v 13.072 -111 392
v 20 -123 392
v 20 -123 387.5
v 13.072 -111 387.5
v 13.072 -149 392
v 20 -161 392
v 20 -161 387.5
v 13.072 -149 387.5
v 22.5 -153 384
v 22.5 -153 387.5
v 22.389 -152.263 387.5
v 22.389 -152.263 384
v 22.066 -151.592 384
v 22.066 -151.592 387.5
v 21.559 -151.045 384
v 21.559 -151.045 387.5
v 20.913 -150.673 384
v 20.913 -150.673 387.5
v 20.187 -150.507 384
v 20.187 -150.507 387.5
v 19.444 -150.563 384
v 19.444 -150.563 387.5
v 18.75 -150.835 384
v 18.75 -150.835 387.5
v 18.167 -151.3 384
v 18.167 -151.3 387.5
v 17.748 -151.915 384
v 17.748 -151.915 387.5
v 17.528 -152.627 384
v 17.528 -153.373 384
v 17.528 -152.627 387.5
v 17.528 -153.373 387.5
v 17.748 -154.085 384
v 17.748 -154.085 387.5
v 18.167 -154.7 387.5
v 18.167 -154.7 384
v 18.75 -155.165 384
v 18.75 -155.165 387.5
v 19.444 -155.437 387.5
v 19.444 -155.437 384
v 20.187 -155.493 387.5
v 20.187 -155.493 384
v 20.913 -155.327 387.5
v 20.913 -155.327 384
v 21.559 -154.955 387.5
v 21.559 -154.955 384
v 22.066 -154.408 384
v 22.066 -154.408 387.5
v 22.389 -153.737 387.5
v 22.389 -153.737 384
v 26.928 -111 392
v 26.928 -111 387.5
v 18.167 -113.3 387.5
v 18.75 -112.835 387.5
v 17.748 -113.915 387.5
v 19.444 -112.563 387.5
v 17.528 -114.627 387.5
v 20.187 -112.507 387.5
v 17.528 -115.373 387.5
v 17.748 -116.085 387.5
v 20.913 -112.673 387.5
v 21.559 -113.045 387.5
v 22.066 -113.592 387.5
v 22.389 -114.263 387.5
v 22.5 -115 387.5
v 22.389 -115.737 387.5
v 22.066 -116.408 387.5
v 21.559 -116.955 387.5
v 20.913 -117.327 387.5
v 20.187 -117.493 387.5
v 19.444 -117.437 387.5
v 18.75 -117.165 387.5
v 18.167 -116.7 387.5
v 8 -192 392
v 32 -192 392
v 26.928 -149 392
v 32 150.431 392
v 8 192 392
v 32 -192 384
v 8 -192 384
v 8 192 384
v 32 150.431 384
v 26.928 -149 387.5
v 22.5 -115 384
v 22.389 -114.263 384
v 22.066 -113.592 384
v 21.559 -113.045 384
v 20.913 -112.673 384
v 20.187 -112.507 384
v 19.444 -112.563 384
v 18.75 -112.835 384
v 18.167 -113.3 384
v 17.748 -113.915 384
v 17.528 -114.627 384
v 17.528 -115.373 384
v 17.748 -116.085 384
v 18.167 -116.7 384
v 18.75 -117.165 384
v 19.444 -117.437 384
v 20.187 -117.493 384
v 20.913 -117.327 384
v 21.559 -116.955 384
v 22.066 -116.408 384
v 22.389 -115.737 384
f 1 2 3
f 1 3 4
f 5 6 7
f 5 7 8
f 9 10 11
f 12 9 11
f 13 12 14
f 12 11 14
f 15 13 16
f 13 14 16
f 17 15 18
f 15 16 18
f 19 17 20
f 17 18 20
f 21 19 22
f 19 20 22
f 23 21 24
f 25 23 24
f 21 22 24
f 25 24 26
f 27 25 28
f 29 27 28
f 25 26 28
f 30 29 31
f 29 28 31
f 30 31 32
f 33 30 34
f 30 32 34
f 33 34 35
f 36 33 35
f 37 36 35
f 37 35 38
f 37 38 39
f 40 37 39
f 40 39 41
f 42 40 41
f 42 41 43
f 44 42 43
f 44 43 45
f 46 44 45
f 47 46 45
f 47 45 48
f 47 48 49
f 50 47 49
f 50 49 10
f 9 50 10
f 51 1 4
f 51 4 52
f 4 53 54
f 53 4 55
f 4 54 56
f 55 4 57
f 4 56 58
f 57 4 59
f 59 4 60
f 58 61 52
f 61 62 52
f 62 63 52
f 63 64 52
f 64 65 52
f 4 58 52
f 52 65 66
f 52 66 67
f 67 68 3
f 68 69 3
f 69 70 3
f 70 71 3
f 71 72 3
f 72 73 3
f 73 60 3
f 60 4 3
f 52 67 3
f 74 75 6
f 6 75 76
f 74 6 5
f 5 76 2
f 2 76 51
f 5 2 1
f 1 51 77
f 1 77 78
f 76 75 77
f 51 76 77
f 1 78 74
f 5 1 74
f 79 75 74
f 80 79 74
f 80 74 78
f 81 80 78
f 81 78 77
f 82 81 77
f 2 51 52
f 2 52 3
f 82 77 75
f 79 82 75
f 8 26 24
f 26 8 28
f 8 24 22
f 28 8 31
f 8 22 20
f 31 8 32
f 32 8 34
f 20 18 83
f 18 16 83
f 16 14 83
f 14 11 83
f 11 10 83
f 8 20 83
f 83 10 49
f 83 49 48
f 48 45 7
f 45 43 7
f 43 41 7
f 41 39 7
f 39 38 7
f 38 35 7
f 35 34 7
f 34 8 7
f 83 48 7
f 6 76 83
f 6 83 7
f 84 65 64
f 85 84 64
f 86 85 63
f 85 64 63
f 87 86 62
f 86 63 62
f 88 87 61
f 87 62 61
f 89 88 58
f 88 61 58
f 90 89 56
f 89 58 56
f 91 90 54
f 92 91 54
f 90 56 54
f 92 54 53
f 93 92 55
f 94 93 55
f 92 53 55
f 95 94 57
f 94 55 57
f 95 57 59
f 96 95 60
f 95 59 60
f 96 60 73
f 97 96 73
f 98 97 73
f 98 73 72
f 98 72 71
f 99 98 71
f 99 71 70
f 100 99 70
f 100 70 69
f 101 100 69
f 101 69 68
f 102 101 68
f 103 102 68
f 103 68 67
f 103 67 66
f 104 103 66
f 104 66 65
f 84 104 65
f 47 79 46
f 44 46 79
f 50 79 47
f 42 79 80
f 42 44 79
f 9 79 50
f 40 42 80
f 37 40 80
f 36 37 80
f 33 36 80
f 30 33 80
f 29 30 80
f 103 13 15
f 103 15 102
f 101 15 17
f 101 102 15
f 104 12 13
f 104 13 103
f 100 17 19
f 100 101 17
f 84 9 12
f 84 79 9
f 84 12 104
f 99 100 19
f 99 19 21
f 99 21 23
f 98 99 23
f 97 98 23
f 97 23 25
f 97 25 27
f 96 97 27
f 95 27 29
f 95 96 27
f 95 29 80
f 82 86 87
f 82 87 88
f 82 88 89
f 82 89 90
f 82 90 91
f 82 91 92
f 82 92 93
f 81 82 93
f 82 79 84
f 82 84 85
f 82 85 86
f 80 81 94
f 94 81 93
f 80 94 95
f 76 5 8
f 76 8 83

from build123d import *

# Parameters (mm, degrees)
SKETCH019_R            = 2.5
PAD013_DEPTH           = 8
POCKET_DEPTH           = 4.5
LINEARPATTERN001_COUNT = 2
LINEARPATTERN001_PITCH = 38


with BuildPart() as linearpattern001:
    # Sketch019 → Pad013 (new body)
    with BuildSketch(Plane.XY.offset(8)):
        Polygon((8, 192), (32, 150.430781), (32, -192), (8, -192), align=None)
        with Locations((20, -115)):
            Circle(SKETCH019_R, mode=Mode.SUBTRACT)
        with Locations((20, -153)):
            Circle(SKETCH019_R, mode=Mode.SUBTRACT)
    extrude(amount=PAD013_DEPTH)

    # Sketch021 → Pocket (cut)
    with BuildSketch(Plane(origin=(0, 0, 8), x_dir=(1, 0, 0), z_dir=(0, 0, -1))):
        Polygon((20, 123), (13.071797, 111), (26.928203, 111), align=None)
    pocket = extrude(amount=-POCKET_DEPTH, mode=Mode.SUBTRACT)

    # LinearPattern001: Pocket ×2
    with Locations(*[(0, -i * LINEARPATTERN001_PITCH, 0) for i in range(1, LINEARPATTERN001_COUNT)]):
        add(pocket, mode=Mode.SUBTRACT)


with BuildPart() as part_mirroring003:
    # Part__Mirroring003: instance of LinearPattern001
    add(linearpattern001.part.mirror(Plane(origin=(0, 0, 200), x_dir=(0, 1, 0), z_dir=(0, 0, 1))))


solid = part_mirroring003.part
